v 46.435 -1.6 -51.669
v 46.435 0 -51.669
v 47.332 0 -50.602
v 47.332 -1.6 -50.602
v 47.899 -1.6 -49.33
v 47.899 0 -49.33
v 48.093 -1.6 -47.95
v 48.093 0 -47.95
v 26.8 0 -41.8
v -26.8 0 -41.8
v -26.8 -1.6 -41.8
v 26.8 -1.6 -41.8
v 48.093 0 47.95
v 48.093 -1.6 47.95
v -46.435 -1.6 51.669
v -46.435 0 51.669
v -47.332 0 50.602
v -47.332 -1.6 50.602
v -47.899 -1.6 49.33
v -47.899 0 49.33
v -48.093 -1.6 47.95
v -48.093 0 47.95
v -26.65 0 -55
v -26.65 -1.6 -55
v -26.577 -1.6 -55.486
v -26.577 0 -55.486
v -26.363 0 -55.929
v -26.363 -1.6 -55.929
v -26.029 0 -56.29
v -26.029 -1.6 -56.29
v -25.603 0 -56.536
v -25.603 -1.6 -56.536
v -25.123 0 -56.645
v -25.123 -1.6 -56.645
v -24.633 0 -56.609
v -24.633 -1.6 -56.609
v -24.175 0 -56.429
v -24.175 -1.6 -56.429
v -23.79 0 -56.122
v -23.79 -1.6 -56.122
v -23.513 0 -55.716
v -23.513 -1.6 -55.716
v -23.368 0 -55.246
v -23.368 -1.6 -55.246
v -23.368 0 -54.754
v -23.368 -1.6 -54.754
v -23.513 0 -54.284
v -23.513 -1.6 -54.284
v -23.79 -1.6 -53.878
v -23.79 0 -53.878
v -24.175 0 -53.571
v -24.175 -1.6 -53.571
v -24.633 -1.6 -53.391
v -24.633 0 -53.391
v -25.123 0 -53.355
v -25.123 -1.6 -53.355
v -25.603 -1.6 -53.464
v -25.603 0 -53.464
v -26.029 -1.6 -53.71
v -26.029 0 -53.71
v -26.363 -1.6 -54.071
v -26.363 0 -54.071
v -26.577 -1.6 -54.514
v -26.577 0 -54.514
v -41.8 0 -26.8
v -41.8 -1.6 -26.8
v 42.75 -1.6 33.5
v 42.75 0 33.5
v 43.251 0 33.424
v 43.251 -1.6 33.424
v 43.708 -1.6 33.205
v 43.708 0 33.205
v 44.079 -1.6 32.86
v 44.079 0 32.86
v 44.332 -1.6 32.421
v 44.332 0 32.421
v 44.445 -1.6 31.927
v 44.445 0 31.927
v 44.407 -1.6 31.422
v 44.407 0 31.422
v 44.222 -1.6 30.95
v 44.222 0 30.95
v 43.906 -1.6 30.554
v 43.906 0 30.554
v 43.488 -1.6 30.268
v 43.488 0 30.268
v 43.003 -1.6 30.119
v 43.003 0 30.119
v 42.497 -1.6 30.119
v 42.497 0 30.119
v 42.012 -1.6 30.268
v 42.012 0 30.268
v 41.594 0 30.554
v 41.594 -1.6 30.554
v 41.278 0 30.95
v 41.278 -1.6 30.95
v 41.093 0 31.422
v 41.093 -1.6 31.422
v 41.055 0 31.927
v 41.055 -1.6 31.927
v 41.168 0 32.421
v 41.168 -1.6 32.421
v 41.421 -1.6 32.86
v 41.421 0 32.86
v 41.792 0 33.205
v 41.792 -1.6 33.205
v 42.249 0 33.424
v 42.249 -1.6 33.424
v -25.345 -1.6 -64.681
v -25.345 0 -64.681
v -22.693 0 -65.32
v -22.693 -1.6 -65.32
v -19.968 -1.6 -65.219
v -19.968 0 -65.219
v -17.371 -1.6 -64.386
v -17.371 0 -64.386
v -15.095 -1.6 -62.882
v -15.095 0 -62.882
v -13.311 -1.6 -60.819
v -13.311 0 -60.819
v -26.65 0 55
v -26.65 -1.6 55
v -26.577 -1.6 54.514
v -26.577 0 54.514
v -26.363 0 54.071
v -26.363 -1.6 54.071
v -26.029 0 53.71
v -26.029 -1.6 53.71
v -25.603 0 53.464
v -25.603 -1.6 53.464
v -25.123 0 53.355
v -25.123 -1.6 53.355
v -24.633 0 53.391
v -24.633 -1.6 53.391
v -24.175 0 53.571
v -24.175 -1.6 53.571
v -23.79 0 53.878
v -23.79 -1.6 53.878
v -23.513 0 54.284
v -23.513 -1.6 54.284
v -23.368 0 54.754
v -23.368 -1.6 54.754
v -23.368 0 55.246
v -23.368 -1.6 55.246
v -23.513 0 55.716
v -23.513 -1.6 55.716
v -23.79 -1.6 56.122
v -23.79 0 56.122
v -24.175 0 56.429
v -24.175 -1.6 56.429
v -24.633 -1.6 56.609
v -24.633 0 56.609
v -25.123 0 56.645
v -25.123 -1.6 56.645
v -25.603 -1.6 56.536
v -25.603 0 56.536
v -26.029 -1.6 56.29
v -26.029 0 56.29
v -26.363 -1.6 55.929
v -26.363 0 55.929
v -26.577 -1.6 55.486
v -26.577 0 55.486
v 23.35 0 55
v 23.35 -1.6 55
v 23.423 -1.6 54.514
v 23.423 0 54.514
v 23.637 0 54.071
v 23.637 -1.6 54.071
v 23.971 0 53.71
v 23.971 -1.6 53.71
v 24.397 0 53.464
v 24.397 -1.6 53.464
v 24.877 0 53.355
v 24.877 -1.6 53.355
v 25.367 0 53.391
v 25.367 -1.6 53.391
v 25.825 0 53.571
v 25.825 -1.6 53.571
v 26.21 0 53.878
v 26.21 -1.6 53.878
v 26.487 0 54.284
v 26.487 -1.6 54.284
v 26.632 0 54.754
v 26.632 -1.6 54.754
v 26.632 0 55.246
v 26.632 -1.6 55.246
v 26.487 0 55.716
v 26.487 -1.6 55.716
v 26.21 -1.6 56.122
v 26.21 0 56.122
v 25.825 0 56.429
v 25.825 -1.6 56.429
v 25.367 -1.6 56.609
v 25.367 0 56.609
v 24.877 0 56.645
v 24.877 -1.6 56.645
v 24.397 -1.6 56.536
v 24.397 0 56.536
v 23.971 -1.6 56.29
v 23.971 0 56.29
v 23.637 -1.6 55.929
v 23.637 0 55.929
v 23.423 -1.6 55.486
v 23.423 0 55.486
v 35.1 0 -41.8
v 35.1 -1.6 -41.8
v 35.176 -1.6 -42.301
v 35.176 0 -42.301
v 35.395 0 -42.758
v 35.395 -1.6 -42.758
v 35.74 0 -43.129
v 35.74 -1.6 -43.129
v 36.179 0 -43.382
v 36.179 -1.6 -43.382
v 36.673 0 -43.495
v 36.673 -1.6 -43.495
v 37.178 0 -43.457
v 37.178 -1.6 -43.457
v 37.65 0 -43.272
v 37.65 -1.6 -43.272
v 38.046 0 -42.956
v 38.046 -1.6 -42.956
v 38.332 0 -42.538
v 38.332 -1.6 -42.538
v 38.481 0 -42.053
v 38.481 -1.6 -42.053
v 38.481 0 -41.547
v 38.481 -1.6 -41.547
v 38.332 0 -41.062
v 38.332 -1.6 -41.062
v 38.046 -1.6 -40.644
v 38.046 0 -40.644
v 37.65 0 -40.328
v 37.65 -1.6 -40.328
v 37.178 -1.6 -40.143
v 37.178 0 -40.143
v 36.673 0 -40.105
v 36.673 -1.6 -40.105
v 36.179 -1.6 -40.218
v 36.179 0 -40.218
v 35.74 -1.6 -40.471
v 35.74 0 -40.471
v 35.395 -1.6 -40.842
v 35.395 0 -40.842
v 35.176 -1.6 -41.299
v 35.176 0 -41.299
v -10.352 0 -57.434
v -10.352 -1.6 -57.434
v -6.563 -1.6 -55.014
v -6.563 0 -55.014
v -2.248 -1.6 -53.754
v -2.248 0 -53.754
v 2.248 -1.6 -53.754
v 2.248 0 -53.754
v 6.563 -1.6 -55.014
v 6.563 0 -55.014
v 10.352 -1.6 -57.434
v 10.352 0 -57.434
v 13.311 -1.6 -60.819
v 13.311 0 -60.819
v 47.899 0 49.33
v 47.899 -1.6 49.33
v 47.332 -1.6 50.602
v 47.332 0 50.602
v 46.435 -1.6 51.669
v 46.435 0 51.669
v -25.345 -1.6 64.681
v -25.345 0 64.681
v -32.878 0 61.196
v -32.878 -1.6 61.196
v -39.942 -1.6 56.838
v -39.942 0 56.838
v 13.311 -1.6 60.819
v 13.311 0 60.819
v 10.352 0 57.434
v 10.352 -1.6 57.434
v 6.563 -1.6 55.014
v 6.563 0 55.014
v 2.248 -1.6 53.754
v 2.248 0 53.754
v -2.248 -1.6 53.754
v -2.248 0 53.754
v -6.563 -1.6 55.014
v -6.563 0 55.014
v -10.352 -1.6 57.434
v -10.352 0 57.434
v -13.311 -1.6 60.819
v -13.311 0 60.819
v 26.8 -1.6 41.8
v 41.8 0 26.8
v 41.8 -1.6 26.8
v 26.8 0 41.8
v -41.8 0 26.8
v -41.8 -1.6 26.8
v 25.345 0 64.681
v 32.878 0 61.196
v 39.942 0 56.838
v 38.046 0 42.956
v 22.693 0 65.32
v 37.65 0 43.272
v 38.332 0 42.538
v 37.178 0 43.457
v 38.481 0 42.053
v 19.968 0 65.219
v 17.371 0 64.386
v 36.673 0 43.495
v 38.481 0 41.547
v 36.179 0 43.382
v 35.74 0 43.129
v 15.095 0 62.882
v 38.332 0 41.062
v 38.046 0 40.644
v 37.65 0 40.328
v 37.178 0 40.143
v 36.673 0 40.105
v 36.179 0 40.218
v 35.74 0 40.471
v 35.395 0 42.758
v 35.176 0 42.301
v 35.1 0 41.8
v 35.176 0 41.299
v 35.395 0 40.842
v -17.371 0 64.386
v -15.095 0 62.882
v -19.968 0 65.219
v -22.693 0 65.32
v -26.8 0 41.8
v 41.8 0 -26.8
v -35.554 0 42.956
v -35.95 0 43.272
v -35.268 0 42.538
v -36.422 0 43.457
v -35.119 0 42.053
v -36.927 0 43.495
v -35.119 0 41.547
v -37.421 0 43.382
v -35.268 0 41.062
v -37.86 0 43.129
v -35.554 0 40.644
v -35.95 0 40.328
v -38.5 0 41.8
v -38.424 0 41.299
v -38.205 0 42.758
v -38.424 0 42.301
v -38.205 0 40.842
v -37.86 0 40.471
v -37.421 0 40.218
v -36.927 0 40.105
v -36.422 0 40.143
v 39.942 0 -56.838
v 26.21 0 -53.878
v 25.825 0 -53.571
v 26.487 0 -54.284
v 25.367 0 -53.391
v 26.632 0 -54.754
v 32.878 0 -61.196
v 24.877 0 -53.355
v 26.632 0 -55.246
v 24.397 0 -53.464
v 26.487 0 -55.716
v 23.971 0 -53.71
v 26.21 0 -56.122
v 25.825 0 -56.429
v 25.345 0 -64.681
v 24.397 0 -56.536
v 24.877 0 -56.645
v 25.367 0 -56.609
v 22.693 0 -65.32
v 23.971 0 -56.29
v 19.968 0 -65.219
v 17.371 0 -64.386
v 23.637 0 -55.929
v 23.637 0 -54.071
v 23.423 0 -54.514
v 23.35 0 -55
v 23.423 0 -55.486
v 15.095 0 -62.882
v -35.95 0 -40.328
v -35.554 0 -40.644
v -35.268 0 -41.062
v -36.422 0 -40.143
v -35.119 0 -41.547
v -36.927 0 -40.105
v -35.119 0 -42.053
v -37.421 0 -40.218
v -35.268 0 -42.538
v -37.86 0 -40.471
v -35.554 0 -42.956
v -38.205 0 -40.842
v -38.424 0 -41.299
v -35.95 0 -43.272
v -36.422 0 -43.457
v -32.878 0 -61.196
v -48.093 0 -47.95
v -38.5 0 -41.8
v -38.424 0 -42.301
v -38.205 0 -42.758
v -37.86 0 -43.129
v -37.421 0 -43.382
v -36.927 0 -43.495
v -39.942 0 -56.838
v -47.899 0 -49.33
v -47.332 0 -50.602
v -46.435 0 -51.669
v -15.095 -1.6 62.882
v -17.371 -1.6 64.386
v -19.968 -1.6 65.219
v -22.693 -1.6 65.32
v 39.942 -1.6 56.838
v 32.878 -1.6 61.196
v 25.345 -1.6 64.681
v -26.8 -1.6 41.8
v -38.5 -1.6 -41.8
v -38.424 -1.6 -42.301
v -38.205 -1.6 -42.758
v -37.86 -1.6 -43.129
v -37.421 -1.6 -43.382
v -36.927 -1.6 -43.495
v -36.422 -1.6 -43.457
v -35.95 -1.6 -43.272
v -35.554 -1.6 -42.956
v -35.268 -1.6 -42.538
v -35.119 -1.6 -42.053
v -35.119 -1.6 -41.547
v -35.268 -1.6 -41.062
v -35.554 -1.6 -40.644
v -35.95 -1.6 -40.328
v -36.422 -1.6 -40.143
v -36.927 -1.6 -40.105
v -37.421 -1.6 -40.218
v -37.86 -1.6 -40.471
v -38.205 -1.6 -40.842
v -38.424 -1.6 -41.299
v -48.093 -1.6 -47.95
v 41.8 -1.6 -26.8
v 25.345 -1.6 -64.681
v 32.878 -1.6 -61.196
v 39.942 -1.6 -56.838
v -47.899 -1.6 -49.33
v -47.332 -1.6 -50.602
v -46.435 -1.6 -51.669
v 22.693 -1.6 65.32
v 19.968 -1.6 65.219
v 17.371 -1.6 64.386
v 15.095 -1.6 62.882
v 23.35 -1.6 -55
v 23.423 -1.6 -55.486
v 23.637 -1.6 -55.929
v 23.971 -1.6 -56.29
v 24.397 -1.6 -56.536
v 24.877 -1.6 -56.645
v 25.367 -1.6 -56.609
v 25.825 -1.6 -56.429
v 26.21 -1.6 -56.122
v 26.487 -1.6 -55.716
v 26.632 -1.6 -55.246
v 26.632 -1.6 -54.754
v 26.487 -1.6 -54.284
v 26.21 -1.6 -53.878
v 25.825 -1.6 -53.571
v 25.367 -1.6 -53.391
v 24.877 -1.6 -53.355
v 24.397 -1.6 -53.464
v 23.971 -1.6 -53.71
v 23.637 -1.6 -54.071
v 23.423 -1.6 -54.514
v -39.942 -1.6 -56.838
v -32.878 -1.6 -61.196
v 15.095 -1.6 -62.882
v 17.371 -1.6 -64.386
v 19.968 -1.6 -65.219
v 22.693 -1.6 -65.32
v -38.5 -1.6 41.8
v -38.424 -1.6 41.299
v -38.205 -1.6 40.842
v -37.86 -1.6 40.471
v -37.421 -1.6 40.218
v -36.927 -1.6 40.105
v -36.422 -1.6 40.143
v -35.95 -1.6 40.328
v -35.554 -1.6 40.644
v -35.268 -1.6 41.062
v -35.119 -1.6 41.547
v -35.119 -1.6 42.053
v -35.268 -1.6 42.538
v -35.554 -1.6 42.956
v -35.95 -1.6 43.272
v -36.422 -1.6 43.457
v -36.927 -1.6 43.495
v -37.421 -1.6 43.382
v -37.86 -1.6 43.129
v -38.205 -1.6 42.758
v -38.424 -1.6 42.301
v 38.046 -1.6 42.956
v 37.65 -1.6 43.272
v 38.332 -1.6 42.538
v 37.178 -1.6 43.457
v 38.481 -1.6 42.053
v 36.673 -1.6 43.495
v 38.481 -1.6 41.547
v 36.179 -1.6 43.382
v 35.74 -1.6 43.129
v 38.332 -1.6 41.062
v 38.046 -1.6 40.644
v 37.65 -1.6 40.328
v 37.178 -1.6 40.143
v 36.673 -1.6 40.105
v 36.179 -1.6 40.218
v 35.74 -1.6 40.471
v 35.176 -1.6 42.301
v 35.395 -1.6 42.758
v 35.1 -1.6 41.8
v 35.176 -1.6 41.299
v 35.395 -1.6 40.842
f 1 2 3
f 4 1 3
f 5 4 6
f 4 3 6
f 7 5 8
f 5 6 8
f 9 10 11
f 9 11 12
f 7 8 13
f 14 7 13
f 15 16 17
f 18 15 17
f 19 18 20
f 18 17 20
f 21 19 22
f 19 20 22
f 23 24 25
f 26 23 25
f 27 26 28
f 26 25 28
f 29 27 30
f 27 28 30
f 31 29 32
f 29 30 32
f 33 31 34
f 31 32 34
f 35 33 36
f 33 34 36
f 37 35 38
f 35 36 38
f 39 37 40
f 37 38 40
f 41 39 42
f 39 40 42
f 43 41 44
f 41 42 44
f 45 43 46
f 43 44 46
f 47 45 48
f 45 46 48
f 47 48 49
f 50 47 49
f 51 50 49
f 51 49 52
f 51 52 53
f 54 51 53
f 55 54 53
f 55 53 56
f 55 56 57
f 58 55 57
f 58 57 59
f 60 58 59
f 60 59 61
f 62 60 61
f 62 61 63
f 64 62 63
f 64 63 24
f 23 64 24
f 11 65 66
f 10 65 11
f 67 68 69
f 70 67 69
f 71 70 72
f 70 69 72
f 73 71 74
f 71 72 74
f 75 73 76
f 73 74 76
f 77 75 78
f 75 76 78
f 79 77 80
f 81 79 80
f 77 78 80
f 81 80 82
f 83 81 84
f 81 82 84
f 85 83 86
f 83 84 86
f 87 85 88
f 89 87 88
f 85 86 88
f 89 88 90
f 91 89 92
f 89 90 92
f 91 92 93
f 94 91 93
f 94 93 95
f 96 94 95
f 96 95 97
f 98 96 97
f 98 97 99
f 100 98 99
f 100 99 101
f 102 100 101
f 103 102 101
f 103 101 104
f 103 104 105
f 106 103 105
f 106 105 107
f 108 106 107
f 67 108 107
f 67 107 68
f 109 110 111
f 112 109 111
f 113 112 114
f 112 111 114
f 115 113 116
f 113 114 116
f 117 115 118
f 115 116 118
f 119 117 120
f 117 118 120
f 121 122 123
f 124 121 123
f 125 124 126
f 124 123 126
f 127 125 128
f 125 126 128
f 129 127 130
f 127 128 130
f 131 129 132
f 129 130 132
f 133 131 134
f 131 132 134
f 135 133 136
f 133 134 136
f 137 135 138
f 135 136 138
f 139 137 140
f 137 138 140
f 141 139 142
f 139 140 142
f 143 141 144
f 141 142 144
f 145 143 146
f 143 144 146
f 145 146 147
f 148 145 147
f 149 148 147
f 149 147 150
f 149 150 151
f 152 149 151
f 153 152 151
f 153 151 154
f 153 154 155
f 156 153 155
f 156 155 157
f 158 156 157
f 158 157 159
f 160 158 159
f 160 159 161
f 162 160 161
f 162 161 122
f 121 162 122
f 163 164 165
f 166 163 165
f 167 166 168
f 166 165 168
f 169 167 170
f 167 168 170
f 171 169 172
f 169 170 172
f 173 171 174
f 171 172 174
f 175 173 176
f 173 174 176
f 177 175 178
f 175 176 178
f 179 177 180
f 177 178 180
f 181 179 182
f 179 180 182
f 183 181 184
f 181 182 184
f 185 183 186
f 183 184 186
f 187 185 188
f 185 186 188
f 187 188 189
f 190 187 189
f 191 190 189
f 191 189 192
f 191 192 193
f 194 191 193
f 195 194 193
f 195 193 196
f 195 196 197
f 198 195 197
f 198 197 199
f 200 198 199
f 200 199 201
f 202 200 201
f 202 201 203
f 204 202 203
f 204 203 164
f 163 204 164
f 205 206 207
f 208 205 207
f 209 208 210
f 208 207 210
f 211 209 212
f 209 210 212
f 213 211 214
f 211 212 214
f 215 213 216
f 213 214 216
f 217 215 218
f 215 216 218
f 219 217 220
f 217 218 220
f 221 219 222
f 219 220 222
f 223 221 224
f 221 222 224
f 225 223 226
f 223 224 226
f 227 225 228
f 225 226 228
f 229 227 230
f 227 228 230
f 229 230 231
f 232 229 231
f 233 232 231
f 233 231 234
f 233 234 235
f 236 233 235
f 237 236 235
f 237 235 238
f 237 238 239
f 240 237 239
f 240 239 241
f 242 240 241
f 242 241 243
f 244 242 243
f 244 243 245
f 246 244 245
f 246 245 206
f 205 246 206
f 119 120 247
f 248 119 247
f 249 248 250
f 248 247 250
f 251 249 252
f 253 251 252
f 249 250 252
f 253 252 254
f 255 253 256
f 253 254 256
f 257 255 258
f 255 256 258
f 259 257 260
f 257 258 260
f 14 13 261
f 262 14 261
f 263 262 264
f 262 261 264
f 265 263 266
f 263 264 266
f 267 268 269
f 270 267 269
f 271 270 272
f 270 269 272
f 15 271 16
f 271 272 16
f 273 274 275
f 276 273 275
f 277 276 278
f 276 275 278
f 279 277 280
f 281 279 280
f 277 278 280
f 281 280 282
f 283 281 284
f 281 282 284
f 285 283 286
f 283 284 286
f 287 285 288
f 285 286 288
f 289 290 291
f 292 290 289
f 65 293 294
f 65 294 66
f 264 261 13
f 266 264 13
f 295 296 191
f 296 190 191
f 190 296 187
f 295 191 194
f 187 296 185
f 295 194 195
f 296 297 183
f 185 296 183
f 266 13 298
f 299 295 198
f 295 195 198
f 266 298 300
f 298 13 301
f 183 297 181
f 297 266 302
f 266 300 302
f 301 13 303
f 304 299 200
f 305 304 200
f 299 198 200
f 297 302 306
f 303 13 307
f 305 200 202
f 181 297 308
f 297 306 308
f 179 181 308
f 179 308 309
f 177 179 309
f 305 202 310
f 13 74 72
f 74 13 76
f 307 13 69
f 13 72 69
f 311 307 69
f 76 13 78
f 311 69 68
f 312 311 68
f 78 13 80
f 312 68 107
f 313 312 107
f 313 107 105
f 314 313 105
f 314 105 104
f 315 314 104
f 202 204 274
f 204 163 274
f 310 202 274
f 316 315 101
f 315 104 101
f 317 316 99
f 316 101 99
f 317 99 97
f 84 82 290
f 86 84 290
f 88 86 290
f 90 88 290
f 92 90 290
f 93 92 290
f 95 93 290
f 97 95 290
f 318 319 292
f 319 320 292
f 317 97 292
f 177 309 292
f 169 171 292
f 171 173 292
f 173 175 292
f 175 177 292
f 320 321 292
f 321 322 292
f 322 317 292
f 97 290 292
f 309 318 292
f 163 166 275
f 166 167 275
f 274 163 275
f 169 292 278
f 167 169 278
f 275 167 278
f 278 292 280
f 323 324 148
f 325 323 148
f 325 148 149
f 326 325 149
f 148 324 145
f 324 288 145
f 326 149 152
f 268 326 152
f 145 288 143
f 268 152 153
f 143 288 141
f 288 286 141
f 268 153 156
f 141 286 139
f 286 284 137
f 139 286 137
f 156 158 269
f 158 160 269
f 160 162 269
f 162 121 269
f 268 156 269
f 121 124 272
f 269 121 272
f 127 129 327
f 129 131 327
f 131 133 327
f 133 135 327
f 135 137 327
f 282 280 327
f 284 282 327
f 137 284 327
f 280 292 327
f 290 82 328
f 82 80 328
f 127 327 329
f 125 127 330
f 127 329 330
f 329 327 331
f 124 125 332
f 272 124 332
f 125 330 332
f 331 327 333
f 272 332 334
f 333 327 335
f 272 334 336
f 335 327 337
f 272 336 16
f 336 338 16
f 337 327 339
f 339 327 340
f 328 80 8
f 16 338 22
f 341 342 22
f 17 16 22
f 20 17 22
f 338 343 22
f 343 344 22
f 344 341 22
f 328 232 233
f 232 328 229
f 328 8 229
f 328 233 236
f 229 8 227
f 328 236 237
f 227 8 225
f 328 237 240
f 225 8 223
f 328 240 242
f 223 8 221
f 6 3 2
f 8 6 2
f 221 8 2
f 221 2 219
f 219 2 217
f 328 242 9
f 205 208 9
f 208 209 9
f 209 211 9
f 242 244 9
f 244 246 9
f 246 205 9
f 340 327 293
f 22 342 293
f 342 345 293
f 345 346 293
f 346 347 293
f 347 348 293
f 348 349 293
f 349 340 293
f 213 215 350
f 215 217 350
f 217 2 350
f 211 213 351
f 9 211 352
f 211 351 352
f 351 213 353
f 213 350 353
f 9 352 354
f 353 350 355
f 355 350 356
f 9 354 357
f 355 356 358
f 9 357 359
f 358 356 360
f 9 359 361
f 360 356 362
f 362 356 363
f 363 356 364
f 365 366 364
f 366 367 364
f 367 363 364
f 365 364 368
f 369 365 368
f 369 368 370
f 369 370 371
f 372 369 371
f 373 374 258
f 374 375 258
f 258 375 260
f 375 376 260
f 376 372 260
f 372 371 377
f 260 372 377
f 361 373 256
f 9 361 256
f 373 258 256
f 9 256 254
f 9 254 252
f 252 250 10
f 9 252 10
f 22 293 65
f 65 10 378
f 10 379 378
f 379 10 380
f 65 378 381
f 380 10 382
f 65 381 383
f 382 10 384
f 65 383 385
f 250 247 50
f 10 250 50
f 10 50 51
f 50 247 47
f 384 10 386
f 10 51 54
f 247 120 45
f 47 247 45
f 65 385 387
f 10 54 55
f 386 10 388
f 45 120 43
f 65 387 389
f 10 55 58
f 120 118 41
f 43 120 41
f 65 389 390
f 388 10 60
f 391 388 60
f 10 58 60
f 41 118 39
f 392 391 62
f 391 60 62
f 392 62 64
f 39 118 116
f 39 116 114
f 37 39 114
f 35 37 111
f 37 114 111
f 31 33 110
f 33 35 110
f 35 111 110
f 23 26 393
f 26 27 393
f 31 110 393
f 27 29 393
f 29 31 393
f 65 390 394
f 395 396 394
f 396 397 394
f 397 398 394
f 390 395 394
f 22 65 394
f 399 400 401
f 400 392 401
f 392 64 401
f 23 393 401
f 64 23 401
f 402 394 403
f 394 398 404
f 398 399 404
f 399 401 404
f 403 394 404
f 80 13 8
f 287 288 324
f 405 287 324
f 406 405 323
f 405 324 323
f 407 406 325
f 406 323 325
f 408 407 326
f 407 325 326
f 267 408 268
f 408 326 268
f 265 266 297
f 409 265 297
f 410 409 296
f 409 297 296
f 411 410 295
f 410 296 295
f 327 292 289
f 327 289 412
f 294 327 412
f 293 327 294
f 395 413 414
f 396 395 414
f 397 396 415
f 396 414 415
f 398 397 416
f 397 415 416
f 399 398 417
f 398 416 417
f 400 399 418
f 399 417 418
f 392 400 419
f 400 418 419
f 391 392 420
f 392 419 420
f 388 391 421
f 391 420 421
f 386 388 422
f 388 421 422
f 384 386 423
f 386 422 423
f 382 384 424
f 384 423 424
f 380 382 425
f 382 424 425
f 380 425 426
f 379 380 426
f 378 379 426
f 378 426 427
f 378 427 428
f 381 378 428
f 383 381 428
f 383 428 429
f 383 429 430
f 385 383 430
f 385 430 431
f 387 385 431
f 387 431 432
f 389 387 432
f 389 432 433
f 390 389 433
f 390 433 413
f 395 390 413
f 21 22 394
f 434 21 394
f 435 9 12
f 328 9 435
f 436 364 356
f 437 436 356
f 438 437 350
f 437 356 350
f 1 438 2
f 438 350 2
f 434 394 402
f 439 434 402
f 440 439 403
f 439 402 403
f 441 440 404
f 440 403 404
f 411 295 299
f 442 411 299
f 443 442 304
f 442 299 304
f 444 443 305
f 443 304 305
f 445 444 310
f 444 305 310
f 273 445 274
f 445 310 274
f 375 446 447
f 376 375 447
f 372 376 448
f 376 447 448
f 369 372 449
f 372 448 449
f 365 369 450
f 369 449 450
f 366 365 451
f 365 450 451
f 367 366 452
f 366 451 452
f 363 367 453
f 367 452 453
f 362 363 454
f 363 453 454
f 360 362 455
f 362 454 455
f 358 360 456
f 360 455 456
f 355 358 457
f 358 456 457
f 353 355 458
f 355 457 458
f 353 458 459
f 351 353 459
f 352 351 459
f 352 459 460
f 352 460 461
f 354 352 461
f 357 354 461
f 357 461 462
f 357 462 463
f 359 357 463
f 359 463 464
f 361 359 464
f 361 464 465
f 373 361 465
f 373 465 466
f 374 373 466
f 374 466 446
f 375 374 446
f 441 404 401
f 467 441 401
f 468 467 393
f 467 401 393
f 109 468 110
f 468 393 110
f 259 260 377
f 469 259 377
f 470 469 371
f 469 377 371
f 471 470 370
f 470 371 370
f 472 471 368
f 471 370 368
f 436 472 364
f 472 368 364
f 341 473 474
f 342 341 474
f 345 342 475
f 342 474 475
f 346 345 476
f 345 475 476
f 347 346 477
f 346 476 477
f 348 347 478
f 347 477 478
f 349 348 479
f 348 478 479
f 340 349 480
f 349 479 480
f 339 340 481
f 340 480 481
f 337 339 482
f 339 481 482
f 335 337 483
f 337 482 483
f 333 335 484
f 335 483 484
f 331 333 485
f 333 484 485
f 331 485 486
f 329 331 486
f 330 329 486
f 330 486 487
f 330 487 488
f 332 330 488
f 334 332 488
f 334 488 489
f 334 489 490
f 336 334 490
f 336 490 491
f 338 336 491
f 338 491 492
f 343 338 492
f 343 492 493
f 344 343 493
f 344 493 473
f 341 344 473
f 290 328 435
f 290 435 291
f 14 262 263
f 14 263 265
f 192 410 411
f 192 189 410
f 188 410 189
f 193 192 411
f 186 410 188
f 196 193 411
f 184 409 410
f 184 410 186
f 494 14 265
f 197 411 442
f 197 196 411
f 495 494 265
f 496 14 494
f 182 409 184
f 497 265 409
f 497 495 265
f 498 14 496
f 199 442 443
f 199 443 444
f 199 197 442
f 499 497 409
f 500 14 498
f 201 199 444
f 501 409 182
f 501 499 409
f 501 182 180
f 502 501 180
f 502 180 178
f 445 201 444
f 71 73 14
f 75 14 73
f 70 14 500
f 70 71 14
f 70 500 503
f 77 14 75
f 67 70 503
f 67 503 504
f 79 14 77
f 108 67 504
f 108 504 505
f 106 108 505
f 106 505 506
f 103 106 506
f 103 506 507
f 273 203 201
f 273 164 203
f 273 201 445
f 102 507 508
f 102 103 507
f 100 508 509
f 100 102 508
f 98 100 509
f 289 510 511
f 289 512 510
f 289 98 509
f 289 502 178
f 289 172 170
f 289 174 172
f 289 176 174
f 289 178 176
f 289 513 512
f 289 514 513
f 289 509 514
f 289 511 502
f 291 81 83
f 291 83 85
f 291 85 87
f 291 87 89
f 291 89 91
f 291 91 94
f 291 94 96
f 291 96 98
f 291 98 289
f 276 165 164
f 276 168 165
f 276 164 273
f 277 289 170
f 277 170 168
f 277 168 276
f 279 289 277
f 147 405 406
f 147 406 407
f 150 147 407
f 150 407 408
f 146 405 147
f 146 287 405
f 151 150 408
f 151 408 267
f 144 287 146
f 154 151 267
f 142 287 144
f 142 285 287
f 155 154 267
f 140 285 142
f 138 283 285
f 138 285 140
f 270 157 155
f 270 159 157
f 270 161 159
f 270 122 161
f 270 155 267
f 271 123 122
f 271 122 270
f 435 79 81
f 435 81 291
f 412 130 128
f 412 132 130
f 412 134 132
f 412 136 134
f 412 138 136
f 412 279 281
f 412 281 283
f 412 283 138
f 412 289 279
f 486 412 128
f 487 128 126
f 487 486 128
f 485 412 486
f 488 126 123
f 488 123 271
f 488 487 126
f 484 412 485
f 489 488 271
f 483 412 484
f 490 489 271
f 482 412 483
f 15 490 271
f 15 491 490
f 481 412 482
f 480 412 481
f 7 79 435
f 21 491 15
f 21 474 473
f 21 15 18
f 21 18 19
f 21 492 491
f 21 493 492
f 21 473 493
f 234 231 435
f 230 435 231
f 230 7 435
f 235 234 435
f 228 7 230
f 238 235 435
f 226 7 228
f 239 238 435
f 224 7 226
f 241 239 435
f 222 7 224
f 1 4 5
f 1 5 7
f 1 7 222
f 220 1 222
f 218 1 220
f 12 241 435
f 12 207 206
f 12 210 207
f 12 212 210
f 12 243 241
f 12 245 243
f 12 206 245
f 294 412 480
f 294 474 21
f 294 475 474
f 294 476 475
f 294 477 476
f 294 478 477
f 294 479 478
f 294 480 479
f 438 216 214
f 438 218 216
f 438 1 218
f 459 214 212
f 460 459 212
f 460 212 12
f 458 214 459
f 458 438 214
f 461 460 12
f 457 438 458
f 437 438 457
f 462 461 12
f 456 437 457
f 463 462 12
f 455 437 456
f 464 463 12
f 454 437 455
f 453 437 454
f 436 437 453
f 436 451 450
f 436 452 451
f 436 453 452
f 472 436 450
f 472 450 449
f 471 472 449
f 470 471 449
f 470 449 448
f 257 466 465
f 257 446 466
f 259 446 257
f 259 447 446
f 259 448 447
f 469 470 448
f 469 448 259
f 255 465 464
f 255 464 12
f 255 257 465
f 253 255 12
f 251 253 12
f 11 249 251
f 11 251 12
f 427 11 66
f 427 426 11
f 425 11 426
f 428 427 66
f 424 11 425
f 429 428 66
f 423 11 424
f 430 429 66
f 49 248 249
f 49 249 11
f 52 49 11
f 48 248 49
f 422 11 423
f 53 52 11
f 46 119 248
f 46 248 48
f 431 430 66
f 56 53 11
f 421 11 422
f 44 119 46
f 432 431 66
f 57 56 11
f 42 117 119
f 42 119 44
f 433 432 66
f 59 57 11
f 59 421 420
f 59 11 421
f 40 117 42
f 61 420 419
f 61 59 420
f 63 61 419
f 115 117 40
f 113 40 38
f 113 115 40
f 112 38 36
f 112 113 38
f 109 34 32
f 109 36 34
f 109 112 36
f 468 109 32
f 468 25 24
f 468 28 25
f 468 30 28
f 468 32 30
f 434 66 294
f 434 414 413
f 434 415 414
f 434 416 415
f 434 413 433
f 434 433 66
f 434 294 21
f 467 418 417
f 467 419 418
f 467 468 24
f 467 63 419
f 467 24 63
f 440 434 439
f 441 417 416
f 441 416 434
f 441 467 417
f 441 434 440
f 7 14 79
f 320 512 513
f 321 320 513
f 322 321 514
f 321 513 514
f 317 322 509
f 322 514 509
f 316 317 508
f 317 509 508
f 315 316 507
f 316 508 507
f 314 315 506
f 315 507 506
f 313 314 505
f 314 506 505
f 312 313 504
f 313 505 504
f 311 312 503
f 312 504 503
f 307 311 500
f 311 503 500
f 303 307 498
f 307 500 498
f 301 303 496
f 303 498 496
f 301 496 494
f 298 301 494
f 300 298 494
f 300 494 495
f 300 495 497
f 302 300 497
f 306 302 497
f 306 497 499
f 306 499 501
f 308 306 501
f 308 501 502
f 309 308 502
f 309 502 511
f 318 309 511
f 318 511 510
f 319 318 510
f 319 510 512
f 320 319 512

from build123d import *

# Parameters (mm, degrees)
BOSS_EXTRUDE1_DEPTH                     = 1.6
ENCLOSURE_MOUNTING_HOLES_M3_CLEARANCE_D = 3.4
BULKHEAD_MOUNTING_HOLES_M4X0_7_TAPPED_D = 3.3
SKETCH14_R                              = 1.7
CUT_EXTRUDE1_DEPTH                      = 82.171141516
CUT_EXTRUDE3_DEPTH                      = 10


with BuildPart() as part:
    # Sketch1 → Boss-Extrude1 (new body)
    with BuildSketch(Plane(origin=(0, 0, 0), x_dir=(1, 0, 0), z_dir=(0, 1, 0))):
        with BuildLine():
            Line((-48.093300583, -47.950176286), (-48.093300583, 47.950176286))
            ThreePointArc((-48.093300583, 47.950176286), (-47.660075225, 49.985997832), (-46.435472835, 51.669031572))
            ThreePointArc((-46.435472835, 51.669031572), (-36.474980605, 59.122903776), (-25.344708101, 64.680659646))
            ThreePointArc((-25.344708101, 64.680659646), (-18.640624701, 64.891621686), (-13.31129345, 60.818850193))
            ThreePointArc((-13.31129345, 60.818850193), (0, 53.594), (13.31129345, 60.818850193))
            ThreePointArc((13.31129345, 60.818850193), (18.640624701, 64.891621686), (25.344708101, 64.680659646))
            ThreePointArc((25.344708101, 64.680659646), (36.474980605, 59.122903776), (46.435472835, 51.669031572))
            ThreePointArc((46.435472835, 51.669031572), (47.660075225, 49.985997832), (48.093300583, 47.950176286))
            Line((48.093300583, 47.950176286), (48.093300583, -47.950176286))
            ThreePointArc((48.093300583, -47.950176286), (47.660075225, -49.985997832), (46.435472835, -51.669031572))
            ThreePointArc((46.435472835, -51.669031572), (36.474980605, -59.122903776), (25.344708101, -64.680659646))
            ThreePointArc((25.344708101, -64.680659646), (18.640624701, -64.891621686), (13.31129345, -60.818850193))
            ThreePointArc((13.31129345, -60.818850193), (0, -53.594), (-13.31129345, -60.818850193))
            ThreePointArc((-13.31129345, -60.818850193), (-18.640624701, -64.891621686), (-25.344708101, -64.680659646))
            ThreePointArc((-25.344708101, -64.680659646), (-36.474980605, -59.122903776), (-46.435472835, -51.669031572))
            ThreePointArc((-46.435472835, -51.669031572), (-47.660075225, -49.985997832), (-48.093300583, -47.950176286))
        make_face()
    extrude(amount=-BOSS_EXTRUDE1_DEPTH)

    # Enclosure Mounting Holes - M3 Clearance Hole1 (through all)
    with Locations(Plane(origin=(0, 0, 0), x_dir=(1, 0, 0), z_dir=(0, 1, 0))):
        with Locations((-36.8, 41.8), (-36.8, -41.8), (36.8, -41.8), (36.8, 41.8)):
            Hole(ENCLOSURE_MOUNTING_HOLES_M3_CLEARANCE_D / 2)

    # Bulkhead Mounting Holes - M4x0.7 Tapped Hole1 (through all)
    with Locations(Plane(origin=(0, 0, 0), x_dir=(1, 0, 0), z_dir=(0, 1, 0))):
        with Locations((-25, 55), (25, 55), (25, -55), (-25, -55)):
            Hole(BULKHEAD_MOUNTING_HOLES_M4X0_7_TAPPED_D / 2)

    # Sketch14 → Cut-Extrude1 (cut, through all)
    with BuildSketch(Plane(origin=(0, 0, 0), x_dir=(1, 0, 0), z_dir=(0, 1, 0))):
        with Locations(Location((42.75, -31.8, 0), (0, 0, 270))):
            Circle(SKETCH14_R)
    extrude(amount=-CUT_EXTRUDE1_DEPTH, mode=Mode.SUBTRACT)

    # Sketch17 → Cut-Extrude3 (cut)
    with BuildSketch(Plane(origin=(0, 0, 0), x_dir=(1, 0, 0), z_dir=(0, 1, 0))):
        Polygon((-26.8, -41.8), (-41.8, -26.8), (-41.8, 26.8), (-26.8, 41.8), (26.8, 41.8), (41.8, 26.8), (41.8, -26.8), (26.8, -41.8), align=None)
    extrude(amount=-CUT_EXTRUDE3_DEPTH, mode=Mode.SUBTRACT)


solid = part.part
